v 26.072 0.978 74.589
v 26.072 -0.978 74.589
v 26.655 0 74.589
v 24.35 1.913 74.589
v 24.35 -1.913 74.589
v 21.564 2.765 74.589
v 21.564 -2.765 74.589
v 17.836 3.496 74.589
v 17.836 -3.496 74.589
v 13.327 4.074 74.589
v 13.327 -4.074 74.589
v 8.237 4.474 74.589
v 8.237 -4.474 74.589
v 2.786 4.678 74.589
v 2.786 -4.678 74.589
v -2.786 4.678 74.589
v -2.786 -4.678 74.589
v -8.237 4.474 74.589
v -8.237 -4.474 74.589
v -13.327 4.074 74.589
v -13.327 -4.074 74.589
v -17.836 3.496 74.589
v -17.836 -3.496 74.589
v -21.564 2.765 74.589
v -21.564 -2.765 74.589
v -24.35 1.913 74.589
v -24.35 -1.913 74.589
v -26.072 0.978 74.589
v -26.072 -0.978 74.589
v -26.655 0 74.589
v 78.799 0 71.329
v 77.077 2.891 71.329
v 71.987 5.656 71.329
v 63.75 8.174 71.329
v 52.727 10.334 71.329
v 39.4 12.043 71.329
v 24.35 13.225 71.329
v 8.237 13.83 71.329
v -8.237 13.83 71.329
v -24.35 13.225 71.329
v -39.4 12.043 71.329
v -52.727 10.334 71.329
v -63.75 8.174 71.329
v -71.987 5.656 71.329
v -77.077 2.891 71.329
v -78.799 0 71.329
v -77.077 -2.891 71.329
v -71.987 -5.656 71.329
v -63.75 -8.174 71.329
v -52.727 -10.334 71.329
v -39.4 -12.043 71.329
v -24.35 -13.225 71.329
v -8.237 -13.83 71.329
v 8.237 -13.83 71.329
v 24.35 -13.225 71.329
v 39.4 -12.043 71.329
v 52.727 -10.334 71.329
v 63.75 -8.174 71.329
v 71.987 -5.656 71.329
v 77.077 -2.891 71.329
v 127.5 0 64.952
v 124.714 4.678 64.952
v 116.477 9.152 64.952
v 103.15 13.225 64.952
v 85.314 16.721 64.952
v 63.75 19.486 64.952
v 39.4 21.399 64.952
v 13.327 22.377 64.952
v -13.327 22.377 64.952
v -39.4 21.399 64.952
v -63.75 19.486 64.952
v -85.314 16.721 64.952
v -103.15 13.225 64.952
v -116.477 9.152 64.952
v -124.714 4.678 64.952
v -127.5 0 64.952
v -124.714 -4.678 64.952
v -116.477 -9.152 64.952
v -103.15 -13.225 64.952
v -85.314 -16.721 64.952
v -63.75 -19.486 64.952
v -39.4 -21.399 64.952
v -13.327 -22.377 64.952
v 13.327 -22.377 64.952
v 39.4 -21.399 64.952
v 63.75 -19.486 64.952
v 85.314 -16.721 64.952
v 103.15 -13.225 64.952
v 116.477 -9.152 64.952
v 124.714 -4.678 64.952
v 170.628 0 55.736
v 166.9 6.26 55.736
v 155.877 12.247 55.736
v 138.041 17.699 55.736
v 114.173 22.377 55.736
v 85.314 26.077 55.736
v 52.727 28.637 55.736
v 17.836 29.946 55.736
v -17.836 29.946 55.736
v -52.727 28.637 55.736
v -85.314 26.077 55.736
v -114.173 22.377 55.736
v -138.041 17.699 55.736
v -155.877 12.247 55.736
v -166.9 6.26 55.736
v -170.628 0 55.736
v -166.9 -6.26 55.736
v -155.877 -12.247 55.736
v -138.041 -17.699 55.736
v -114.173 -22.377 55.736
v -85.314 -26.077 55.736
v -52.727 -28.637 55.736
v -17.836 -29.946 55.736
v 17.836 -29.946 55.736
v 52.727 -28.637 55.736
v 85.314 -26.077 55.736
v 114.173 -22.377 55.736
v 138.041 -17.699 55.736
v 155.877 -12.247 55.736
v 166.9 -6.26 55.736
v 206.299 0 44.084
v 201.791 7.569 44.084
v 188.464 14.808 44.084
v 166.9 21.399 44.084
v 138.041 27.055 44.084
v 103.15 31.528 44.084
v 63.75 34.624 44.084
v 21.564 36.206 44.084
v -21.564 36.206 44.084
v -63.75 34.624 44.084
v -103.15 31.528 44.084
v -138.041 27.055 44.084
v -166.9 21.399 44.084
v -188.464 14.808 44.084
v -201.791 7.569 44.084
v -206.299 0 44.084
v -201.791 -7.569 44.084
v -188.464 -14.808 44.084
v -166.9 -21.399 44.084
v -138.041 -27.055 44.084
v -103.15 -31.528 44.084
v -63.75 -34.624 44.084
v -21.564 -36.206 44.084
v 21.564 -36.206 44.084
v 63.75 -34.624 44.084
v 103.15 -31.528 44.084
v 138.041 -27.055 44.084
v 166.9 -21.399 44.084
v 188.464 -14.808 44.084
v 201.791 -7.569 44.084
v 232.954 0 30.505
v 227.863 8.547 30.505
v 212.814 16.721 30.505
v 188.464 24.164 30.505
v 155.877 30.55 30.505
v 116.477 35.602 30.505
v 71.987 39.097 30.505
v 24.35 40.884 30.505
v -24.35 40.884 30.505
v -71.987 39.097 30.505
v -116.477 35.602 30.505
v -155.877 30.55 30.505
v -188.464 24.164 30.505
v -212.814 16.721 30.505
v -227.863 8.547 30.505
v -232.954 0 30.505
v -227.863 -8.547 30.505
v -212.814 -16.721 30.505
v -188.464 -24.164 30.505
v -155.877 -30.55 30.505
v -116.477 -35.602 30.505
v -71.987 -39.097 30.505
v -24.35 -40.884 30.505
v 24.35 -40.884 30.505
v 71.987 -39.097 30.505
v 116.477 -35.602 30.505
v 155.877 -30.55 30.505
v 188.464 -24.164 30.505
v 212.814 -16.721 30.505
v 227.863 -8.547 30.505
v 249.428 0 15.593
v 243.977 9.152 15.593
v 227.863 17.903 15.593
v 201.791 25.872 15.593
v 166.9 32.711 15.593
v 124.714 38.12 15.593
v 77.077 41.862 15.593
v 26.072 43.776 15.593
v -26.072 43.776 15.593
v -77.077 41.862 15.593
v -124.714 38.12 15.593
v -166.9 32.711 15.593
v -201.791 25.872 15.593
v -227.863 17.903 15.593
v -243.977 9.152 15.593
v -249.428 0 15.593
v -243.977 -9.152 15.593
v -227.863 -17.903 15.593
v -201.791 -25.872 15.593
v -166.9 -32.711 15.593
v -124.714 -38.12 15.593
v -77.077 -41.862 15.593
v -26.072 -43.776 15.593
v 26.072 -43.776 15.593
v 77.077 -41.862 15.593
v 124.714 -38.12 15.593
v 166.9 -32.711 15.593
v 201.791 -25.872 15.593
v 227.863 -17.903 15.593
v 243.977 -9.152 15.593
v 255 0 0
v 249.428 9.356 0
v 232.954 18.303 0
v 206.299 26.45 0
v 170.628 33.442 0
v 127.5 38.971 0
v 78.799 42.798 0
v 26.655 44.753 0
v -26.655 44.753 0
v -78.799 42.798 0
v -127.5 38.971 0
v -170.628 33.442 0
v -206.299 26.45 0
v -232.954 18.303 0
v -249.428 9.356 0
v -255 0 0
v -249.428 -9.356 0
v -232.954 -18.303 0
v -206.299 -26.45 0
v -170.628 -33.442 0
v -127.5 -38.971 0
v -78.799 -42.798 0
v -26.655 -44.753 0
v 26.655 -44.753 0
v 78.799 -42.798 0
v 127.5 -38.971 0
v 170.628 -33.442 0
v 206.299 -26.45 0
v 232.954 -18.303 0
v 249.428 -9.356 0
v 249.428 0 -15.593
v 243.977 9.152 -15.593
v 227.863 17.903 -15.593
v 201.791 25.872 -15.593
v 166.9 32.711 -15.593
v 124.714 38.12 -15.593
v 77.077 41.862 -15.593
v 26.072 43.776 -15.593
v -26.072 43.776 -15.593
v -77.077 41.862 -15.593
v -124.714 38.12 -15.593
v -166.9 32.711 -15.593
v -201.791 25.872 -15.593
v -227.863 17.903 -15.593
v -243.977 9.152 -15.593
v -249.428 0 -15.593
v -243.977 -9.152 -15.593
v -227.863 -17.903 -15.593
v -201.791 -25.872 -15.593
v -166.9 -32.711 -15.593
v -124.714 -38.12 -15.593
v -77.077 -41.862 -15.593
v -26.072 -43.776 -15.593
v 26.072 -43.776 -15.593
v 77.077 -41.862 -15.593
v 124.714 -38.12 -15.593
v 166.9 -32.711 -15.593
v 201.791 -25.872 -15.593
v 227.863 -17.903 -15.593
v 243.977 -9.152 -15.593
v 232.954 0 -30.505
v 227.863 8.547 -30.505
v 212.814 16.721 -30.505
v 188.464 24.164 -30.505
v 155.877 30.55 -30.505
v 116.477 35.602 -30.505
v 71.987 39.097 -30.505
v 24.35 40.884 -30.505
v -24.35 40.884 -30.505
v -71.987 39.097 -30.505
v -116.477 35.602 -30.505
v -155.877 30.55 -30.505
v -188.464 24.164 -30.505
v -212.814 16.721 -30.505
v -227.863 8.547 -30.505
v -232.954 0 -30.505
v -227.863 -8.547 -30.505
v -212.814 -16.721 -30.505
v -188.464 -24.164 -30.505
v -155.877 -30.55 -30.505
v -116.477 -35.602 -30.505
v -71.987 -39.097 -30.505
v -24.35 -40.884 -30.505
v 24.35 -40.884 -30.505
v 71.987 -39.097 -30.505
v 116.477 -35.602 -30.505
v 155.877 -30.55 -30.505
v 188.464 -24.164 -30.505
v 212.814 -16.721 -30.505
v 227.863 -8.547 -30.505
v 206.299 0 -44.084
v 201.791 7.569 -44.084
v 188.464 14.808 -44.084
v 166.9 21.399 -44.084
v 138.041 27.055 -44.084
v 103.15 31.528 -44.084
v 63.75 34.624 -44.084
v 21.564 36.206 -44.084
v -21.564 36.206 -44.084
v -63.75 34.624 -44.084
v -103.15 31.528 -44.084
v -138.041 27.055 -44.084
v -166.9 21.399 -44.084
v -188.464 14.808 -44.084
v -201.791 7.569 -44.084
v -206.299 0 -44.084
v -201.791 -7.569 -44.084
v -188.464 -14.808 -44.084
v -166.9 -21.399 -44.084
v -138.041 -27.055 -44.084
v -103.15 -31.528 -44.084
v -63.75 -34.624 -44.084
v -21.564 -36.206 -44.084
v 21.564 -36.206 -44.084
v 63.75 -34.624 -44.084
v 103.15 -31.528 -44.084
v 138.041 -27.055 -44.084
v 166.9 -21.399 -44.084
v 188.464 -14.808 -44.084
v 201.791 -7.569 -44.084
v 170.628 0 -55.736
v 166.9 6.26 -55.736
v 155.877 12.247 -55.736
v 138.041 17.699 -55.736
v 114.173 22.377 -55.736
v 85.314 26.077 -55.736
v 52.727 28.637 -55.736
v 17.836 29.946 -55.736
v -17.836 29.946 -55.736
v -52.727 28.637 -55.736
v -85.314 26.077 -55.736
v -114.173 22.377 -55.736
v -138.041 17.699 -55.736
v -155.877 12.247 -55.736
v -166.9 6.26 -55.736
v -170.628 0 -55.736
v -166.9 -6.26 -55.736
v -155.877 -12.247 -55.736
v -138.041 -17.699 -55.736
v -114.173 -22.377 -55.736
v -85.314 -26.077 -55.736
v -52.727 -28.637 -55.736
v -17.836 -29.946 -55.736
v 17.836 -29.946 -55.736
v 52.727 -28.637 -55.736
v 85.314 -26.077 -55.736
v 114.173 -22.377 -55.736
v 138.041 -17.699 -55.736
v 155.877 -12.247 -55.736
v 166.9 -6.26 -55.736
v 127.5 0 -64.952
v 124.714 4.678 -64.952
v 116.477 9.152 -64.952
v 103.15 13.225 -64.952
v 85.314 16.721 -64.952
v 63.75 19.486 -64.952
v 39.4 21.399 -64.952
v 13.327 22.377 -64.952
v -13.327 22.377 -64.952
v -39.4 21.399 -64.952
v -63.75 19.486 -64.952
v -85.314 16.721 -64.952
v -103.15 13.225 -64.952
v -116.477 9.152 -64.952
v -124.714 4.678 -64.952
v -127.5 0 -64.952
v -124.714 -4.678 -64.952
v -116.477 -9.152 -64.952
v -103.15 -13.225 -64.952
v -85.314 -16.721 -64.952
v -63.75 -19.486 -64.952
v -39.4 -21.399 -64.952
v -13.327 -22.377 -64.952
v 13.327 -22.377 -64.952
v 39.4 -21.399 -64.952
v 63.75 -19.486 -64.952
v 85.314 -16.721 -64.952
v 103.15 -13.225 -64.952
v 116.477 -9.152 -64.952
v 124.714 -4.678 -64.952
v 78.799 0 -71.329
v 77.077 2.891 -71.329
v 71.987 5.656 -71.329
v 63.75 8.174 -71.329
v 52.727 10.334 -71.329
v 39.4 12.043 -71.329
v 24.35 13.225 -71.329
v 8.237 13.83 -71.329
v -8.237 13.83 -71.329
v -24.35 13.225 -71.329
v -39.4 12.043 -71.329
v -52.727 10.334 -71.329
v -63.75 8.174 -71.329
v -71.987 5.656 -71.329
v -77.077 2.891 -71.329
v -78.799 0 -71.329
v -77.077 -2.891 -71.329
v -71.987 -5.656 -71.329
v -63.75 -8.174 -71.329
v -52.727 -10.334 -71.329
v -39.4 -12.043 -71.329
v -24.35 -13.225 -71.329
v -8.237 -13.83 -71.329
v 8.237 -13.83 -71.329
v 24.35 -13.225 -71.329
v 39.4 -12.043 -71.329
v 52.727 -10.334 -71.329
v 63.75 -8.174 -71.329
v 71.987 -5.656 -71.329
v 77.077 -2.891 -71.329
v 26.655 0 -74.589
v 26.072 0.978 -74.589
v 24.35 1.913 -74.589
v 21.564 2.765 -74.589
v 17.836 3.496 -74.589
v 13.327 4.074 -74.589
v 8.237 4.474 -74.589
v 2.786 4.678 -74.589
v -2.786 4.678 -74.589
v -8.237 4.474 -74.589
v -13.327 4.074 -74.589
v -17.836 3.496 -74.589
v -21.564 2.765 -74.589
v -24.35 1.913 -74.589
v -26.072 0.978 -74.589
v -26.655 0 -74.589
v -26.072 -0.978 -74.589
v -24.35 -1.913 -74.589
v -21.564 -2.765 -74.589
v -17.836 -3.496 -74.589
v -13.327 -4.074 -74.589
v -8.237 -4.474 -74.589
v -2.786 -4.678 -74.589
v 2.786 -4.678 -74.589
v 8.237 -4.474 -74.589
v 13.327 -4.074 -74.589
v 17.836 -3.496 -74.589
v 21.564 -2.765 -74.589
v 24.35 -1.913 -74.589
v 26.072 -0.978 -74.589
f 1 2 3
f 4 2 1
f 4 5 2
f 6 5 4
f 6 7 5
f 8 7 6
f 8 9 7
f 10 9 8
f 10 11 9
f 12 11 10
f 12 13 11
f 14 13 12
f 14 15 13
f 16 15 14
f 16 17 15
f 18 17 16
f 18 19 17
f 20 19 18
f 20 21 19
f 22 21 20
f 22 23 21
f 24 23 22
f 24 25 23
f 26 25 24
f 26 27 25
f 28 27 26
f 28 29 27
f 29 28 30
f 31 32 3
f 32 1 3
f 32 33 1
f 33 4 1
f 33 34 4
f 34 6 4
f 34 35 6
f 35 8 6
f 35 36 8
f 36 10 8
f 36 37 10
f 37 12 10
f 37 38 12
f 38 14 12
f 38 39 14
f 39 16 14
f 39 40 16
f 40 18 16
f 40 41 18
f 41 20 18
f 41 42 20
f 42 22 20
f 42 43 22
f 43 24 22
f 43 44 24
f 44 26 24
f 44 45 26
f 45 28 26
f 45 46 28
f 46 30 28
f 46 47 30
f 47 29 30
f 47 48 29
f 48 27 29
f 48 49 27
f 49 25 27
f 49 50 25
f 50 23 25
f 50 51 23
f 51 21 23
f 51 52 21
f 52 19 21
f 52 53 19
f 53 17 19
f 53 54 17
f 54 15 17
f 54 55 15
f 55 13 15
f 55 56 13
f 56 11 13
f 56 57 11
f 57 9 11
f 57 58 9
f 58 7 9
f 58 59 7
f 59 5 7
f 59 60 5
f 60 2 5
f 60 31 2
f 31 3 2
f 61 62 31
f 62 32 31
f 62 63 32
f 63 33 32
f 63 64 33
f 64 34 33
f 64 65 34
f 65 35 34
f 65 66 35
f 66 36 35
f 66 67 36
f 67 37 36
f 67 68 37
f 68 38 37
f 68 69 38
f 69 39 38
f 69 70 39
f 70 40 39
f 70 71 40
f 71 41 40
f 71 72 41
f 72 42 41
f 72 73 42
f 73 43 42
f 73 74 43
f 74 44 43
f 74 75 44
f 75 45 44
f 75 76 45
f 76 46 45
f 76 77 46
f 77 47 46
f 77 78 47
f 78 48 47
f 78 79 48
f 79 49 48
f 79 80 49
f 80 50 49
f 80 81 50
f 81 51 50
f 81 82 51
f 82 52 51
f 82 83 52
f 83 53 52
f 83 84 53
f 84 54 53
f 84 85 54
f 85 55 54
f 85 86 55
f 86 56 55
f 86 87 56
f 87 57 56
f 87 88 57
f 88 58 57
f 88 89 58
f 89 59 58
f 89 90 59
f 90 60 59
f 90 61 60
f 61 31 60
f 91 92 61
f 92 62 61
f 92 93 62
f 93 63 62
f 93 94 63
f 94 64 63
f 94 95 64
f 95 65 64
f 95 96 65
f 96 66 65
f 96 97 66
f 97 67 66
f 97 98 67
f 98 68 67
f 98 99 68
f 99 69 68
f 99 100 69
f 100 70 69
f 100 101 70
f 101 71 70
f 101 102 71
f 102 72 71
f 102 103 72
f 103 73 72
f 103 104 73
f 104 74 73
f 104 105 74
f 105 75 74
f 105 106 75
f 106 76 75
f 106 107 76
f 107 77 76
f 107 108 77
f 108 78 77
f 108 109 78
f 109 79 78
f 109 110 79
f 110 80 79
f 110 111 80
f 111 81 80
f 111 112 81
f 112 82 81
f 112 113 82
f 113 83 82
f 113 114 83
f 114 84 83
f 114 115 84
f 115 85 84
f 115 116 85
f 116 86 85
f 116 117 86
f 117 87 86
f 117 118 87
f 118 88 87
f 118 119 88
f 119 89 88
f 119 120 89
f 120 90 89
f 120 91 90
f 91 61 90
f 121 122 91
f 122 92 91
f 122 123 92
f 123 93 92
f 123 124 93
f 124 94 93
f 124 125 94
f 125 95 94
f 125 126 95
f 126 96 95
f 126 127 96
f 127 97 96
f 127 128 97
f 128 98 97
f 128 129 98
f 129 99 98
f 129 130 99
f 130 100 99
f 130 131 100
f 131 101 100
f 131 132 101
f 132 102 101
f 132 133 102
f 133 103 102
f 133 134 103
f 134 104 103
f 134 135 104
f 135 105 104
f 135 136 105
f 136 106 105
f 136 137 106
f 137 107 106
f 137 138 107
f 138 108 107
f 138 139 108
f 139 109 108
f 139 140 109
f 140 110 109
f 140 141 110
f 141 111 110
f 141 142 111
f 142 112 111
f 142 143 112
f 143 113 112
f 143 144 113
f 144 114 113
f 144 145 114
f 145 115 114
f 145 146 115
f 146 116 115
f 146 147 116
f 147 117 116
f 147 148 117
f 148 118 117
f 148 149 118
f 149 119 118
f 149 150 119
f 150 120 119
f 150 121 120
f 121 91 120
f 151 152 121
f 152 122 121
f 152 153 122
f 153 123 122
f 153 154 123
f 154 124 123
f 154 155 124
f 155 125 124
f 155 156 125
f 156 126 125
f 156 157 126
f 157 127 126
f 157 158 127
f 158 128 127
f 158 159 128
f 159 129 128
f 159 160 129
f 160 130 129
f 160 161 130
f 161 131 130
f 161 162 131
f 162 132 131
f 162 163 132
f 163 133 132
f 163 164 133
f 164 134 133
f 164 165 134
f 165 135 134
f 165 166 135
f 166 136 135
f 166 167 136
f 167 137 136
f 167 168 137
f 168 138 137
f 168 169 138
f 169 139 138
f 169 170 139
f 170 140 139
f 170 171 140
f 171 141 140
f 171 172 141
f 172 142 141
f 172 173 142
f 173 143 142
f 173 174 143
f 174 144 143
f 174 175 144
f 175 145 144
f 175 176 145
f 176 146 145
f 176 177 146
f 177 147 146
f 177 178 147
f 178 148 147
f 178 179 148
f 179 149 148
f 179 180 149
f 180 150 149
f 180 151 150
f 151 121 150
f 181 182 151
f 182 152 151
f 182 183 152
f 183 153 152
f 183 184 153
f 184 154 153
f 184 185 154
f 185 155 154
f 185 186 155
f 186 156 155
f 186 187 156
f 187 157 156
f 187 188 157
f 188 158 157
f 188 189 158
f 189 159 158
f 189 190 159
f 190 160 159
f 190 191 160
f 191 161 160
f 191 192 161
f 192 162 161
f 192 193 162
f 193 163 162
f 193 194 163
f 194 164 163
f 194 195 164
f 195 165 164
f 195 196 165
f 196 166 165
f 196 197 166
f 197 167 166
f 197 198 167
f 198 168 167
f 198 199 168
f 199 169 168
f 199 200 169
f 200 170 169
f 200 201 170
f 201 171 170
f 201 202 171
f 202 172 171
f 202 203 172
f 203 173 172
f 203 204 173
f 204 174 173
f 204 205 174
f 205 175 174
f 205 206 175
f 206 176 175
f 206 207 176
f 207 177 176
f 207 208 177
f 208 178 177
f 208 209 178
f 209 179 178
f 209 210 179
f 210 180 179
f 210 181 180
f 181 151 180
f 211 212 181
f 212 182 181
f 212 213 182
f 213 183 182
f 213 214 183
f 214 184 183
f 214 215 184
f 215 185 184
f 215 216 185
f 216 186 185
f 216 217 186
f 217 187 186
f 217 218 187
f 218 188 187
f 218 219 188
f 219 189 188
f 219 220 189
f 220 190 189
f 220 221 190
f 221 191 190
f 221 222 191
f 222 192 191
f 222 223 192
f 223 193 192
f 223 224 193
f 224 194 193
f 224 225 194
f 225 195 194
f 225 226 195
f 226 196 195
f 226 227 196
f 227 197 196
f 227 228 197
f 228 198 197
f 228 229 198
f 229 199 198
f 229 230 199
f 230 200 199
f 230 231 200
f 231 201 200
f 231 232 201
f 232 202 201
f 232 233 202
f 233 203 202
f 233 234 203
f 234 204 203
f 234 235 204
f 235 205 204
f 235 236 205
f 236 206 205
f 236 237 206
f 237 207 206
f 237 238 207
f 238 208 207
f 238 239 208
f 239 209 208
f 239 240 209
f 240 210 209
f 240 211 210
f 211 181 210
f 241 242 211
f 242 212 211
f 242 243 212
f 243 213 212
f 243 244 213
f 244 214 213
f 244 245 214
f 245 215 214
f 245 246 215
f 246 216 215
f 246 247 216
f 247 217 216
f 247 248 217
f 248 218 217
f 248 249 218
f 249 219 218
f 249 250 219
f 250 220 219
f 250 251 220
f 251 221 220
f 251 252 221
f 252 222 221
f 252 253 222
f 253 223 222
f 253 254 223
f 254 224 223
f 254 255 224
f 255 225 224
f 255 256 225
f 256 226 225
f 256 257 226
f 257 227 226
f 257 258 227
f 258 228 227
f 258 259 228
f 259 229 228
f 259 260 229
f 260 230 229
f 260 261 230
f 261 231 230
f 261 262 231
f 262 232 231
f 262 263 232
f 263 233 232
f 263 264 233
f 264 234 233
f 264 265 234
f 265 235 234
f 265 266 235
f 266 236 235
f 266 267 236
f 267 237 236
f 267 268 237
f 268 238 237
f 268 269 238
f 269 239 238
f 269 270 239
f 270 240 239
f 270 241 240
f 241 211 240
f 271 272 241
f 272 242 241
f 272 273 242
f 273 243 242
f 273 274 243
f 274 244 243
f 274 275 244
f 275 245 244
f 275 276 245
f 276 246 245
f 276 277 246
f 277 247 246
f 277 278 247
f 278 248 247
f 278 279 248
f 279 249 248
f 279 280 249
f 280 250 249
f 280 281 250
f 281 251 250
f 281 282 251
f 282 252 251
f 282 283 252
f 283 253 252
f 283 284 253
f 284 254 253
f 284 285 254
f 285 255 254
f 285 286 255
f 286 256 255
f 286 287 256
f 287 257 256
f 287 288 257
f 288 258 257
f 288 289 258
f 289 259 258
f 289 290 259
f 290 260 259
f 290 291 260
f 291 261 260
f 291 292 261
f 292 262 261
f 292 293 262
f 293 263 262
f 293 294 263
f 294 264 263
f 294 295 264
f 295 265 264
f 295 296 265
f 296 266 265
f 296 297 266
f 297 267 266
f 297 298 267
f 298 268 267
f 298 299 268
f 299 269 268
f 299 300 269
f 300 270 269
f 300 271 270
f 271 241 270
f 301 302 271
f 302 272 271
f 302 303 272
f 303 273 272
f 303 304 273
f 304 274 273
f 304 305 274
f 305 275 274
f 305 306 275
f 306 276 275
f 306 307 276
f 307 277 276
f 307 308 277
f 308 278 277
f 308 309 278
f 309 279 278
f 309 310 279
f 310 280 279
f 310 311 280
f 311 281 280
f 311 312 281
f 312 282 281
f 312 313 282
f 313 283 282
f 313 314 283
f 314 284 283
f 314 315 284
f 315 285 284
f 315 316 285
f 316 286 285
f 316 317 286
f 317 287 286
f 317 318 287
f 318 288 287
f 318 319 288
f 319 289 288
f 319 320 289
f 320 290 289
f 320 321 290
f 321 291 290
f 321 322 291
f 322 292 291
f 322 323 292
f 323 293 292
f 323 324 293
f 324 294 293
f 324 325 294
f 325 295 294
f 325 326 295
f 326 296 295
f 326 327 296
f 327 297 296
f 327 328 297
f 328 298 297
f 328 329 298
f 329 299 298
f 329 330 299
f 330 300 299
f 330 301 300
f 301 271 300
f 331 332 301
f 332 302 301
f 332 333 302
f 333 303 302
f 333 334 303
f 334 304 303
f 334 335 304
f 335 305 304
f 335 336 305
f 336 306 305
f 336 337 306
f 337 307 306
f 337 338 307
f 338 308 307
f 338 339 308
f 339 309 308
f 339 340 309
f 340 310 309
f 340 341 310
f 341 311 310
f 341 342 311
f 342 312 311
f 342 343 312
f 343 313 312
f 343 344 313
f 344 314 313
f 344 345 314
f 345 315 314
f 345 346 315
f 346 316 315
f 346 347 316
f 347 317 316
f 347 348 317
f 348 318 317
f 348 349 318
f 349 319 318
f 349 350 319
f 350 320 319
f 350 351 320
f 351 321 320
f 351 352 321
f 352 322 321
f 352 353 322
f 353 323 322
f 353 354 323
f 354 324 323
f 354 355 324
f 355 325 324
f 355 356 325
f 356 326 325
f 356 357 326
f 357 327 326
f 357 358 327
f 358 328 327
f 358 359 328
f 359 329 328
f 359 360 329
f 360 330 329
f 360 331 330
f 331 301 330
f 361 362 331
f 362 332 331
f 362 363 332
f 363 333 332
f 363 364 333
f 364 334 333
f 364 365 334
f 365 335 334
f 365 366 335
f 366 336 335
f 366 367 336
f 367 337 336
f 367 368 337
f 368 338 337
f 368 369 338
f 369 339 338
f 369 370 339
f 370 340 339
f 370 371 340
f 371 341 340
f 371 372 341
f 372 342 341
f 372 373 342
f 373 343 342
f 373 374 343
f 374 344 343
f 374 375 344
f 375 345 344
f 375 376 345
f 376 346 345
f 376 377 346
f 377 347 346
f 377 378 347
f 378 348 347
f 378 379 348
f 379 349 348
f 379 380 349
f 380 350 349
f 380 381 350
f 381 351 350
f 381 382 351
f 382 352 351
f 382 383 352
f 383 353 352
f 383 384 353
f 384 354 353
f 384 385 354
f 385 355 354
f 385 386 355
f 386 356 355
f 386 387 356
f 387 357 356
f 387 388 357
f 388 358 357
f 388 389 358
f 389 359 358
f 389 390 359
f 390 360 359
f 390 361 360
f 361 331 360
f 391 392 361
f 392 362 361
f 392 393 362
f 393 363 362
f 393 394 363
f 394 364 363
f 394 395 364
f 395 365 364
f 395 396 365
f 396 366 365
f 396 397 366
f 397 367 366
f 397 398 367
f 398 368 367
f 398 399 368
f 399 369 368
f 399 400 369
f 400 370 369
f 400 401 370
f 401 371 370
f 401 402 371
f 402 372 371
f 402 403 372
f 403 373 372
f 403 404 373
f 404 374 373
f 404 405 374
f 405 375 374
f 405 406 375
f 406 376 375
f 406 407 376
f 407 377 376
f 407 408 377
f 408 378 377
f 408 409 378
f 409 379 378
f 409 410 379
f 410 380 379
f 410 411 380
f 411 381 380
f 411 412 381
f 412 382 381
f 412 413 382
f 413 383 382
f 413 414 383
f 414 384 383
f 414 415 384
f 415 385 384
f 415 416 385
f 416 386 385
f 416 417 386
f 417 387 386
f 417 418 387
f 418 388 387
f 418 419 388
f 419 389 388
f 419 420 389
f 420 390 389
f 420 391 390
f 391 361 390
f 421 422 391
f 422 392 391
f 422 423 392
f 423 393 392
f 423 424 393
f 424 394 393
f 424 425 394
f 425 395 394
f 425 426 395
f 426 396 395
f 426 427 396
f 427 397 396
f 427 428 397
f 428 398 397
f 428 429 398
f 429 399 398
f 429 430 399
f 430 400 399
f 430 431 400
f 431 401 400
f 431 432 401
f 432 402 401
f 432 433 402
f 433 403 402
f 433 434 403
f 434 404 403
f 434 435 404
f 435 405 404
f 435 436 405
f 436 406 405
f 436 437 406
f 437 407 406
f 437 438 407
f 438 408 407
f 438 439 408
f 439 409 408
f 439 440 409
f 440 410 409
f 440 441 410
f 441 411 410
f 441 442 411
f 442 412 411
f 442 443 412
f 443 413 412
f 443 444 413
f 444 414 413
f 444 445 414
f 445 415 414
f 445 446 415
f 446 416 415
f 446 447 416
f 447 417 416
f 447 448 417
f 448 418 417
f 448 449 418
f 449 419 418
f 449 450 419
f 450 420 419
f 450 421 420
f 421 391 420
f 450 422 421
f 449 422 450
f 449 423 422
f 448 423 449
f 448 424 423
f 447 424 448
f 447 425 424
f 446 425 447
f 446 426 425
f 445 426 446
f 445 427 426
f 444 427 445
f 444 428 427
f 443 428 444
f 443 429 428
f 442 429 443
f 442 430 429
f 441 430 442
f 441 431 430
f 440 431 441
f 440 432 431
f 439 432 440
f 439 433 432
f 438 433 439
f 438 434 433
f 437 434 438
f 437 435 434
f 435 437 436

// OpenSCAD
// Generated by SolidPython 1.0.1 on 2020-07-29 00:46:52


scale(v = [17, 3, 5]) {
	sphere(r = 15);
}
/***********************************************
*********      SolidPython code:      **********
************************************************
 
# import packages: SolidPython
from solid import *
from solid.utils import *
from itertools import chain, combinations, permutations


class Resize:

    def __init__(self, scad_file):
        self.scad_file = scad_file
        #self.scad_file = import_scad(scad_file)
        # cone/cylinder param:
        self.r1 = 0
        self.r2 = 0
        self.h = 0
        # rectangular prism param:
        self.w = 0
        self.l = 0
        # ellipse param:
        self.r = 0

    # import OpenScad code (file name corresponds to shape)


    # classify shape + parameters
    def assign(self, param1, param2, param3):
        if self.scad_file == 'cone.scad':
            self.r1 = param1
            self.r2 = param2
            self.h = param3
        elif self.scad_file == 'cylinder.scad':
            self.r1 = param1
            self.r2 = param2
            self.h = param3
        elif self.scad_file == 'rectangularPrism.scad':
            self.h = param1
            self.l = param2
            self.w = param3
        else:
            self.r = param1
            self.h = param2

    # resize parameters
    def iterate(self):
        x = range(3, 20, 2)
        i = 1
        if self.scad_file == 'cone.scad':
            tempList = list(permutations(x, 2))
            for temp in tempList:
                param1 = temp[0]
                param2 = temp[1]
                filepath = 'produced_scad_files/' + 'cone' + str(param1) + '_' + str(param2) + '_' + '.scad'
                scad_render_to_file(cylinder(h=param1, r1=param2, r2=0), filepath)

        elif self.scad_file == 'cylinder.scad':
            tempList = list(permutations(x, 3))
            for temp in tempList:
                param1 = temp[0]
                param2 = temp[1]
                filepath = 'produced_scad_files/' + 'cylinder' + str(param1) + '_' + str(param2) + '_' + '.scad'
                scad_render_to_file(cylinder(h=param1, r1=param2, r2=param2), filepath)

        elif self.scad_file == 'rectangularPrism.scad':
            tempList = list(permutations(x, 3))
            for temp in tempList:
                param1 = temp[0]
                param2 = temp[1]
                param3 = temp[2]
                filepath = 'produced_scad_files/' + 'rectangularPrism' + str(param1) + '_' + str(param2) + '_' + str(
                    param3) + '.scad'
                scad_render_to_file(cube(size=(param1, param2, param3)), filepath)

        elif self.scad_file == 'ellipse.scad':
            tempList = list(permutations(x, 4))
            for temp in tempList:
                param1 = temp[0]
                param2 = temp[1]
                param3 = temp[2]
                param4 = temp[3]
                filepath = 'produced_scad_files/' + 'ellipse' + str(param1) + '_' + str(param2) + '_' + str(param3) + '_' + str(param4) + '.scad'
                scad_render_to_file(scale([param1, param2, param3])(sphere(r=param4)), filepath)

    def render_to_scadfile(self):
        scad_render_to_file(scad, 'example.scad') 
 
************************************************/
